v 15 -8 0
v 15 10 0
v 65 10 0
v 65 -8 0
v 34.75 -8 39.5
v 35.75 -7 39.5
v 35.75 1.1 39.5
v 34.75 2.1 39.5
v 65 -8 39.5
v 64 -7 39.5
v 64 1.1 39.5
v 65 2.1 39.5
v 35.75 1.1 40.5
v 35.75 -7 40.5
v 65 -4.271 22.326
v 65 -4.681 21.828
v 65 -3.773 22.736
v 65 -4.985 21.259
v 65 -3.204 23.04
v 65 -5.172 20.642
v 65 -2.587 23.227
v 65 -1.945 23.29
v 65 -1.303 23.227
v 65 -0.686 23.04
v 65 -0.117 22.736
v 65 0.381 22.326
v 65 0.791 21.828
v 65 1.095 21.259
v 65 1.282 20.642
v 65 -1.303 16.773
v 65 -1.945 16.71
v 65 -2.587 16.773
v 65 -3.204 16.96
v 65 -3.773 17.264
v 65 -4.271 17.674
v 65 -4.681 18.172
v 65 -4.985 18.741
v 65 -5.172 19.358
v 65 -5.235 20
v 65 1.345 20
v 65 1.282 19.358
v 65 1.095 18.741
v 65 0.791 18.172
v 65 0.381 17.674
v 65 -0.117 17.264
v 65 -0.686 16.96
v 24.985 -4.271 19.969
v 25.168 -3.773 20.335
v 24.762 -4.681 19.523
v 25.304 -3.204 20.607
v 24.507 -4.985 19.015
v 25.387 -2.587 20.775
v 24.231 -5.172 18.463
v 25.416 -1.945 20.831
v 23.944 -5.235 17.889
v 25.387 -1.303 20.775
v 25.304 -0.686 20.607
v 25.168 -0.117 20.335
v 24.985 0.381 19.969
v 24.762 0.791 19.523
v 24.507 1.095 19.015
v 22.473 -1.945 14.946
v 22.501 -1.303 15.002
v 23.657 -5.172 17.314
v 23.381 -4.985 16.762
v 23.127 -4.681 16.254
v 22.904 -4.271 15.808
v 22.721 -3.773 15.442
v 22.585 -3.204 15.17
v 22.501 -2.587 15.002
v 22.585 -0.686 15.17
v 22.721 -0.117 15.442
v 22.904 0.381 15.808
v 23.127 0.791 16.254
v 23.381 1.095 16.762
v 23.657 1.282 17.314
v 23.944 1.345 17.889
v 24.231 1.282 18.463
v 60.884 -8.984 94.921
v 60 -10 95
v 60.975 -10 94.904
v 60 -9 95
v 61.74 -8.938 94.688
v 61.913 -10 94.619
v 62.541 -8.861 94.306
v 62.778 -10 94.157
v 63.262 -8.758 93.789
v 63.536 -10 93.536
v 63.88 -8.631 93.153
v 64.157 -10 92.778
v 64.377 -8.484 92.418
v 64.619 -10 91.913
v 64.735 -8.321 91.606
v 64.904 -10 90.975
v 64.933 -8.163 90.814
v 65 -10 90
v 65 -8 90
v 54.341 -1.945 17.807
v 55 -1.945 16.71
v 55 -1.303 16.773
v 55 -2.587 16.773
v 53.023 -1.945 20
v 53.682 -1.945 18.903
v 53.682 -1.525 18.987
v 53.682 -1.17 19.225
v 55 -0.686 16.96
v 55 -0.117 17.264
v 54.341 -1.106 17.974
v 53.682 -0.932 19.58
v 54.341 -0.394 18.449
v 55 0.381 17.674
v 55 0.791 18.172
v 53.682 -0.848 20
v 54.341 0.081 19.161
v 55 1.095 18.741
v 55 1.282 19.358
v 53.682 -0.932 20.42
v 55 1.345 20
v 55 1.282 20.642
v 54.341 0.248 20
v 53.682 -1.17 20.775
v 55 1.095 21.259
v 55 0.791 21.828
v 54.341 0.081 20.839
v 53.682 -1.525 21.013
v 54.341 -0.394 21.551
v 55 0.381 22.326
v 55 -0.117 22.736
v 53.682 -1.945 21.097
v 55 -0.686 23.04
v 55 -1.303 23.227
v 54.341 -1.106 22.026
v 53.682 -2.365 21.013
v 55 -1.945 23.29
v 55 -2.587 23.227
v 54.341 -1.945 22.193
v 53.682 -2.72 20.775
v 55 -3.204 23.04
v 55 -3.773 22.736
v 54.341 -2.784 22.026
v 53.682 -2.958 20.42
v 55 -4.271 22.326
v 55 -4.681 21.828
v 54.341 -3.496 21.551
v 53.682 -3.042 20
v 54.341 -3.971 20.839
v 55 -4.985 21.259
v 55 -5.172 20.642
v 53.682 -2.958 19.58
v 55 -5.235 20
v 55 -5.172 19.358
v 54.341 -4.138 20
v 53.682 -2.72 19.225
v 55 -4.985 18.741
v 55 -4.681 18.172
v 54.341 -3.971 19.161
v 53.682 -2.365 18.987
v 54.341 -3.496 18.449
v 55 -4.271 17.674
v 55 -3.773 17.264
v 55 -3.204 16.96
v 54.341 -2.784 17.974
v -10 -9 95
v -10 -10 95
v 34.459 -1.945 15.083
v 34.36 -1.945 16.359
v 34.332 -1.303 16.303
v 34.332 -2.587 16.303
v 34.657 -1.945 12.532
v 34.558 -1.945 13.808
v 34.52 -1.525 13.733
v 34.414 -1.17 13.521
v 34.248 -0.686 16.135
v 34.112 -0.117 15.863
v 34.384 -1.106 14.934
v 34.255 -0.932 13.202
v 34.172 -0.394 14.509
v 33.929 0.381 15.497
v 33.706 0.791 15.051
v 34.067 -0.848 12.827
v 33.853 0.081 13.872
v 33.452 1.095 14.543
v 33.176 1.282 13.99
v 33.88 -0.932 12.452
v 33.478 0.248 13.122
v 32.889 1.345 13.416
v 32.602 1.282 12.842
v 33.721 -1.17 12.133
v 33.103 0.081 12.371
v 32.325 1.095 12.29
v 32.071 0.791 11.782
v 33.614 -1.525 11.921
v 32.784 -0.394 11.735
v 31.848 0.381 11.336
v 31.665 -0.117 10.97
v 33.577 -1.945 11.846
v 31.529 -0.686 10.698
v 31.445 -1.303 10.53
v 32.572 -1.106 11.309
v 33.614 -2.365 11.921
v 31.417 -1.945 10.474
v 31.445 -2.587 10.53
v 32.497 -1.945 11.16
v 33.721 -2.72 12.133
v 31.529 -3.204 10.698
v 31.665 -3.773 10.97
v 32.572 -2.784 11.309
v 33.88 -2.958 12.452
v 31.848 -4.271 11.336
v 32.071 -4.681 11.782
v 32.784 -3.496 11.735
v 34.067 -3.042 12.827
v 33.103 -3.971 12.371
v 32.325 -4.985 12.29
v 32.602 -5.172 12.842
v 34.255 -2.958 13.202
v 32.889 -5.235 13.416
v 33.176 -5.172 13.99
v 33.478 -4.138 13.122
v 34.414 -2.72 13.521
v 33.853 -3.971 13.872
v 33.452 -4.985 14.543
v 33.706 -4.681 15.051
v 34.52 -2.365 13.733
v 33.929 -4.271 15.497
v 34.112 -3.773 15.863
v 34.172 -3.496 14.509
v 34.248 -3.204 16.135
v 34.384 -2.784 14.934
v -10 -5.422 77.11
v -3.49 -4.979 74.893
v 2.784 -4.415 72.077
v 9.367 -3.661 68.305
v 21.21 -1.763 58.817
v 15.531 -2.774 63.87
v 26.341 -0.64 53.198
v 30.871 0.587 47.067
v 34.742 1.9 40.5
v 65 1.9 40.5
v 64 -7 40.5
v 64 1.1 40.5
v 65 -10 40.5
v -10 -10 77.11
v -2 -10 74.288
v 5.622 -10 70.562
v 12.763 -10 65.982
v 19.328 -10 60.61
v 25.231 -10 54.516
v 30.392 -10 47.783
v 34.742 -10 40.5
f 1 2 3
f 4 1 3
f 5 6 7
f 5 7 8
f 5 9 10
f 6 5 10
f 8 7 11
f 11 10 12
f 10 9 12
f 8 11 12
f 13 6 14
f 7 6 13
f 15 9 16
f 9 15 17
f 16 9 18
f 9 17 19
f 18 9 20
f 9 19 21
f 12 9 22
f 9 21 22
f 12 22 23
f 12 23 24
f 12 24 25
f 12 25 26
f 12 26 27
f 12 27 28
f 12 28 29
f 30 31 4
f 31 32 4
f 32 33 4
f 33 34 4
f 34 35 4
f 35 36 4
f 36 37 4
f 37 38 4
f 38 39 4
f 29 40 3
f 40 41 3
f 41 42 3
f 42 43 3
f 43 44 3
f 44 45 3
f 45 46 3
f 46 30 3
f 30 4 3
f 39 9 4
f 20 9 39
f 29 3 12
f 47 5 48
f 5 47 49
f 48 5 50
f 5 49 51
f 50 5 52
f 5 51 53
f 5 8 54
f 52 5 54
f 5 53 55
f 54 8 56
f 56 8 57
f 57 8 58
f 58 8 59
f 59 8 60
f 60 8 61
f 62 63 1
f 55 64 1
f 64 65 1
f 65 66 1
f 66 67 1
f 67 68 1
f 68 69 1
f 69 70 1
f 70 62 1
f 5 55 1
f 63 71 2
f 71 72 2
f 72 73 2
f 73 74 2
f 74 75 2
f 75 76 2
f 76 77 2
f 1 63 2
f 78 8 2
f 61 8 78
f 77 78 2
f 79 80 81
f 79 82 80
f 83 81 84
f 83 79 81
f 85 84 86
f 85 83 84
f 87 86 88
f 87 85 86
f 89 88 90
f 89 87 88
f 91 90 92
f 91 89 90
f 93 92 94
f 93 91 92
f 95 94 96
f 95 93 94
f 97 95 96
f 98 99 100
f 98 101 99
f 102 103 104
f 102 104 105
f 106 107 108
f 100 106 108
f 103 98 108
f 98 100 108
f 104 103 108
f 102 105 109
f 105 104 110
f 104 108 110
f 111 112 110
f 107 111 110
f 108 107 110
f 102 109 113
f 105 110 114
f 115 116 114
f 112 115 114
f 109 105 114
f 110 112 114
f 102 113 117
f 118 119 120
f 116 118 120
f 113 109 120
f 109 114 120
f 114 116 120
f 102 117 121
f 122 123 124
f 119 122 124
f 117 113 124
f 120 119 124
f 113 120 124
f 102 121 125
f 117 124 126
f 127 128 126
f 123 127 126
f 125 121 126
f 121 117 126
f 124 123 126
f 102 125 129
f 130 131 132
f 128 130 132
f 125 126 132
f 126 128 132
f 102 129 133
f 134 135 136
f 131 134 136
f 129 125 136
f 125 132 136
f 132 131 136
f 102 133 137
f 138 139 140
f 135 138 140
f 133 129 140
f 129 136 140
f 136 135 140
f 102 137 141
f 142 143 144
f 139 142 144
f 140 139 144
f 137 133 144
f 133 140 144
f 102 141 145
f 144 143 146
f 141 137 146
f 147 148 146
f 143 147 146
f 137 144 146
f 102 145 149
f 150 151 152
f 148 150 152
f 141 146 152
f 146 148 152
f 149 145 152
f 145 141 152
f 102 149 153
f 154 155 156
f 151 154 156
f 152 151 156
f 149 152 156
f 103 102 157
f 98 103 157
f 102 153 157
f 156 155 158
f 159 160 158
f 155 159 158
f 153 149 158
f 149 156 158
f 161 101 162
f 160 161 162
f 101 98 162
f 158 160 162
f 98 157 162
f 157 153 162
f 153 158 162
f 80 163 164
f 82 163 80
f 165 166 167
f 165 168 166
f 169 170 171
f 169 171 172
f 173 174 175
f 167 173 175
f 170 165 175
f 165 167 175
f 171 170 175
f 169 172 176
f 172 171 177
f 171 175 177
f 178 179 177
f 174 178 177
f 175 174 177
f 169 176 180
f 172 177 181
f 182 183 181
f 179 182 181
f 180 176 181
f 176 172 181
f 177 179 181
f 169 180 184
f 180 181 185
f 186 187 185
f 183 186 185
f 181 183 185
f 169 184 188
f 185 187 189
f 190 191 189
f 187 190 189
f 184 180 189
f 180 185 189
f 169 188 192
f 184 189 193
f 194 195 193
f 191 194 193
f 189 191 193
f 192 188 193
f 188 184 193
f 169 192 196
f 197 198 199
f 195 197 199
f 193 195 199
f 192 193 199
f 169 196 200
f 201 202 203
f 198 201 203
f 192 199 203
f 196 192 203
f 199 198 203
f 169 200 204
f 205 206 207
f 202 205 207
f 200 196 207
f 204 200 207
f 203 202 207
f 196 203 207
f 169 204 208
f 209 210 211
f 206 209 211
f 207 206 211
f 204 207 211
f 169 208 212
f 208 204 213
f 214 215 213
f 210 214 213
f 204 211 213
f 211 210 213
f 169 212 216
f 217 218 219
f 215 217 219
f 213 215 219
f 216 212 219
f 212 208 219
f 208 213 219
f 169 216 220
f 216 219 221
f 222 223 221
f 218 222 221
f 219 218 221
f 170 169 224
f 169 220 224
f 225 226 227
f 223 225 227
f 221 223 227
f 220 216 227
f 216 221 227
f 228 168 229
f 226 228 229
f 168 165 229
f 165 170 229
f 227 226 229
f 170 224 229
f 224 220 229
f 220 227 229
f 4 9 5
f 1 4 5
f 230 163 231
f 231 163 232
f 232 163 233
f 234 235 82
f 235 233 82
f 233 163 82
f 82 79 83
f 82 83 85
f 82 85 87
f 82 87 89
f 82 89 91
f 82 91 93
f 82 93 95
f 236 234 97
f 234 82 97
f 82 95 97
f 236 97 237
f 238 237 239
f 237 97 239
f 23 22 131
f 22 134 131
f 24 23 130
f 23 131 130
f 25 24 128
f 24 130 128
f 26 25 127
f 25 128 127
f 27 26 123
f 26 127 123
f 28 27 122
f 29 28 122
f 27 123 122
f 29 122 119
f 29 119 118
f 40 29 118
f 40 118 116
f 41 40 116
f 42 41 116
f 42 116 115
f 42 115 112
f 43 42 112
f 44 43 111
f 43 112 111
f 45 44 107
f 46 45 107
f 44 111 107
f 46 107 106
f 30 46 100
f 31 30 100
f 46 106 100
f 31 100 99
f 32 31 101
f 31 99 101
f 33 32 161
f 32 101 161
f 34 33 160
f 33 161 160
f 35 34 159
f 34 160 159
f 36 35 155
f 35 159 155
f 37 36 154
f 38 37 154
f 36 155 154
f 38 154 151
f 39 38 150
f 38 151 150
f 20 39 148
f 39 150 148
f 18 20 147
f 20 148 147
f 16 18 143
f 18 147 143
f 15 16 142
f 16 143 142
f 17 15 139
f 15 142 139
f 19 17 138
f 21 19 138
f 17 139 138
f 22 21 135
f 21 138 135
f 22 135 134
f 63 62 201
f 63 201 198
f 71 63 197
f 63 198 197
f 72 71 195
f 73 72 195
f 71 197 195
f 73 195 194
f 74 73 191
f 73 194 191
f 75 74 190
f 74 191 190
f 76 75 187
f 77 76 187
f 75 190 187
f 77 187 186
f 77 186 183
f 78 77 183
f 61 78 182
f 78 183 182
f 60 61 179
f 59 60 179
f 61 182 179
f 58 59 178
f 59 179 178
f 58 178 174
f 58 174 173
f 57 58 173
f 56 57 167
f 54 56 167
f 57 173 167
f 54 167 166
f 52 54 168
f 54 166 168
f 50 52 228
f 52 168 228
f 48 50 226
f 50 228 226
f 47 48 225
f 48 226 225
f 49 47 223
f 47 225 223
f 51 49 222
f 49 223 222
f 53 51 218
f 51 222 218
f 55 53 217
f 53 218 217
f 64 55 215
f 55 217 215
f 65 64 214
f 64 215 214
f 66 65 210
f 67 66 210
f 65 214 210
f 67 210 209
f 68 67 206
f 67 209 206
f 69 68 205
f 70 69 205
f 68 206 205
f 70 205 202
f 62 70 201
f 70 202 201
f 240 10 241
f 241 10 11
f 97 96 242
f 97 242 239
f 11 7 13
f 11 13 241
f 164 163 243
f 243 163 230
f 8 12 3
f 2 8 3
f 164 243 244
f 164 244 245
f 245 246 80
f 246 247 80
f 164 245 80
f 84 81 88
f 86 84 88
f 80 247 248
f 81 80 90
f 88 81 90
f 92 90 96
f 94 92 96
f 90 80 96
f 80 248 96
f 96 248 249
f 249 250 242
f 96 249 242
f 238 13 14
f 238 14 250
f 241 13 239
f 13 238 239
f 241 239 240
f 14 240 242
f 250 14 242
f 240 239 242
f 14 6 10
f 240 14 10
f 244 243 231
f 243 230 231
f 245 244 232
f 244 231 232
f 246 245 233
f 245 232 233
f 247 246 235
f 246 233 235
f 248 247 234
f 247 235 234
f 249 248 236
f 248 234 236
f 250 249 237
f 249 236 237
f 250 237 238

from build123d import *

# Parameters (mm, degrees)
ESBO_O1_W                                      = 130
ESBO_O1_H                                      = 20
RESSALTO_EXTRUS_O1_DEPTH                       = 95
CORTE_EXTRUS_O2_REACH                          = 22
CORTE_EXTRUS_O3_DEPTH                          = 1
CORTE_EXTRUS_O3_DEPTH_BACK                     = 131
BROCA_DE_ROSQUEAR_DE_CANO_PARA_TARRAXA_D_D     = 6.579997
BROCA_DE_ROSQUEAR_DE_CANO_PARA_TARRAXA_D_DEPTH = 10
BROCA_DE_ROSQUEAR_DE_CANO_PARA_TARRAXA_D_TIP   = 1.976830535
BROCA_DE_ROSQUEAR_DE_CANO_PARA_TARRA_2_D       = 6.579997
BROCA_DE_ROSQUEAR_DE_CANO_PARA_TARRA_2_DEPTH   = 10
BROCA_DE_ROSQUEAR_DE_CANO_PARA_TARRA_2_TIP     = 1.976830535
FILETE2_R                                      = 5
CORTE_EXTRUS_O5_DEPTH                          = 131
RESSALTO_EXTRUS_O2_REACH                       = 57.5
ESBO_O15_W                                     = 28.25
ESBO_O15_H                                     = 8.1
ESBO_O16_W                                     = 50
ESBO_O16_H                                     = 2
CORTE_EXTRUS_O6_DEPTH                          = 40.5
CORTE_EXTRUS_O7_REACH                          = 21.612
ESBO_O17_W                                     = 55
ESBO_O17_H                                     = 19.621819015


with BuildPart() as part:
    # Esboço1 → Ressalto-extrusão1 (new body)
    with BuildSketch(Plane.XY):
        Rectangle(ESBO_O1_W, ESBO_O1_H)
    extrude(amount=RESSALTO_EXTRUS_O1_DEPTH)

    # Esboço2 → Corte-extrusão2 (cut, up to next)
    with BuildSketch(Plane(origin=(0, 10, 0), x_dir=(1, 0, 0), z_dir=(0, 1, 0)), mode=Mode.PRIVATE) as corte_extrus_o2_sk1:
        with BuildLine():
            Line((15, 0), (-65, 0))
            Line((-65, 0), (-65, -80))
            Line((-65, -80), (-30.4, -80))
            ThreePointArc((-30.4, -80), (7.930824636, -69.206398281), (35, -40))
            Line((35, -40), (15, 0))
        make_face()
    corte_extrus_o2_tool1 = extrude(corte_extrus_o2_sk1.sketch, amount=-CORTE_EXTRUS_O2_REACH, mode=Mode.PRIVATE) & part.part
    add(corte_extrus_o2_tool1.solids().sort_by_distance((-21.312918, 10, 38.404489))[0], mode=Mode.SUBTRACT)

    # Esboço3 → Corte-extrusão3 (cut, two sides)
    with BuildSketch(Plane(origin=(65, 0, 0), x_dir=(0, 0, -1), z_dir=(1, 0, 0))) as corte_extrus_o3_sk:
        Polygon((200.200134404, 50.040026881), (0, 10), (-95, -9), (-295.200134404, -49.040026881), (-375.280188165, 351.360241926), (120.120080642, 450.440295688), align=None)
    extrude(amount=CORTE_EXTRUS_O3_DEPTH, mode=Mode.SUBTRACT)
    extrude(corte_extrus_o3_sk.sketch, amount=-CORTE_EXTRUS_O3_DEPTH_BACK, mode=Mode.SUBTRACT)

    # Broca de rosquear de cano para tarraxa d
    with Locations(Plane(origin=(65, 0, 0), x_dir=(0, 0, -1), z_dir=(1, 0, 0))):
        with Locations((-20, -1.945)):
            Hole(BROCA_DE_ROSQUEAR_DE_CANO_PARA_TARRAXA_D_D / 2, depth=BROCA_DE_ROSQUEAR_DE_CANO_PARA_TARRAXA_D_DEPTH)
            with Locations((0, 0, -(BROCA_DE_ROSQUEAR_DE_CANO_PARA_TARRAXA_D_DEPTH + BROCA_DE_ROSQUEAR_DE_CANO_PARA_TARRAXA_D_TIP / 2))):  # 118° drill point
                Cone(0, BROCA_DE_ROSQUEAR_DE_CANO_PARA_TARRAXA_D_D / 2, BROCA_DE_ROSQUEAR_DE_CANO_PARA_TARRAXA_D_TIP, mode=Mode.SUBTRACT)

    # Broca de rosquear de cano para tarra 2
    with Locations(Plane(origin=(12, 0, -6), x_dir=(0.447213595, 0, 0.894427191), z_dir=(-0.894427191, 0, 0.447213595))):
        with Locations((26.708203932, -1.945)):
            Hole(BROCA_DE_ROSQUEAR_DE_CANO_PARA_TARRA_2_D / 2, depth=BROCA_DE_ROSQUEAR_DE_CANO_PARA_TARRA_2_DEPTH)
            with Locations((0, 0, -(BROCA_DE_ROSQUEAR_DE_CANO_PARA_TARRA_2_DEPTH + BROCA_DE_ROSQUEAR_DE_CANO_PARA_TARRA_2_TIP / 2))):  # 118° drill point
                Cone(0, BROCA_DE_ROSQUEAR_DE_CANO_PARA_TARRA_2_D / 2, BROCA_DE_ROSQUEAR_DE_CANO_PARA_TARRA_2_TIP, mode=Mode.SUBTRACT)

    # Filete2
    filete2_edges = [part.edges().sort_by_distance(p)[0] for p in [
        (65, -9.5, 95),
    ]]
    fillet(filete2_edges, radius=FILETE2_R)

    # Esboço14 → Corte-extrusão5 (cut, through all)
    with BuildSketch(Plane(origin=(65, 0, 0), x_dir=(0, 0, -1), z_dir=(1, 0, 0))):
        Polygon((-40.5, -10), (-39.5, -10), (-39.5, 2.1), (-40.5, 1.9), align=None)
    extrude(amount=-CORTE_EXTRUS_O5_DEPTH, mode=Mode.SUBTRACT)

    # Esboço15 → Ressalto-extrusão2 (add, up to next)
    with BuildSketch(Plane.XY.offset(39.5), mode=Mode.PRIVATE) as ressalto_extrus_o2_sk1:
        with Locations((49.875, -2.95)):
            Rectangle(ESBO_O15_W, ESBO_O15_H)
    ressalto_extrus_o2_tool1 = extrude(ressalto_extrus_o2_sk1.sketch, amount=RESSALTO_EXTRUS_O2_REACH, mode=Mode.PRIVATE) - part.part
    add(ressalto_extrus_o2_tool1.solids().sort_by_distance((49.875, -2.95, 39.5))[0])

    # Esboço16 → Corte-extrusão6 (cut)
    with BuildSketch(Plane(origin=(0, 0, 0), x_dir=(-1, 0, 0), z_dir=(0, 0, -1))):
        with Locations((-40, -9)):
            Rectangle(ESBO_O16_W, ESBO_O16_H)
    extrude(amount=-CORTE_EXTRUS_O6_DEPTH, mode=Mode.SUBTRACT)

    # Esboço17 → Corte-extrusão7 (cut, up to next)
    with BuildSketch(Plane(origin=(0, 9.615384615, 1.923076923), x_dir=(1, 0, 0), z_dir=(0, 0.980580676, 0.196116135)), mode=Mode.PRIVATE) as corte_extrus_o7_sk1:
        with Locations((-37.5, -86.4868795)):
            Rectangle(ESBO_O17_W, ESBO_O17_H)
    corte_extrus_o7_tool1 = extrude(corte_extrus_o7_sk1.sketch, amount=-CORTE_EXTRUS_O7_REACH, mode=Mode.PRIVATE) & part.part
    add(corte_extrus_o7_tool1.solids().sort_by_distance((-37.5, -7.346088, 86.73044))[0], mode=Mode.SUBTRACT)


solid = part.part
